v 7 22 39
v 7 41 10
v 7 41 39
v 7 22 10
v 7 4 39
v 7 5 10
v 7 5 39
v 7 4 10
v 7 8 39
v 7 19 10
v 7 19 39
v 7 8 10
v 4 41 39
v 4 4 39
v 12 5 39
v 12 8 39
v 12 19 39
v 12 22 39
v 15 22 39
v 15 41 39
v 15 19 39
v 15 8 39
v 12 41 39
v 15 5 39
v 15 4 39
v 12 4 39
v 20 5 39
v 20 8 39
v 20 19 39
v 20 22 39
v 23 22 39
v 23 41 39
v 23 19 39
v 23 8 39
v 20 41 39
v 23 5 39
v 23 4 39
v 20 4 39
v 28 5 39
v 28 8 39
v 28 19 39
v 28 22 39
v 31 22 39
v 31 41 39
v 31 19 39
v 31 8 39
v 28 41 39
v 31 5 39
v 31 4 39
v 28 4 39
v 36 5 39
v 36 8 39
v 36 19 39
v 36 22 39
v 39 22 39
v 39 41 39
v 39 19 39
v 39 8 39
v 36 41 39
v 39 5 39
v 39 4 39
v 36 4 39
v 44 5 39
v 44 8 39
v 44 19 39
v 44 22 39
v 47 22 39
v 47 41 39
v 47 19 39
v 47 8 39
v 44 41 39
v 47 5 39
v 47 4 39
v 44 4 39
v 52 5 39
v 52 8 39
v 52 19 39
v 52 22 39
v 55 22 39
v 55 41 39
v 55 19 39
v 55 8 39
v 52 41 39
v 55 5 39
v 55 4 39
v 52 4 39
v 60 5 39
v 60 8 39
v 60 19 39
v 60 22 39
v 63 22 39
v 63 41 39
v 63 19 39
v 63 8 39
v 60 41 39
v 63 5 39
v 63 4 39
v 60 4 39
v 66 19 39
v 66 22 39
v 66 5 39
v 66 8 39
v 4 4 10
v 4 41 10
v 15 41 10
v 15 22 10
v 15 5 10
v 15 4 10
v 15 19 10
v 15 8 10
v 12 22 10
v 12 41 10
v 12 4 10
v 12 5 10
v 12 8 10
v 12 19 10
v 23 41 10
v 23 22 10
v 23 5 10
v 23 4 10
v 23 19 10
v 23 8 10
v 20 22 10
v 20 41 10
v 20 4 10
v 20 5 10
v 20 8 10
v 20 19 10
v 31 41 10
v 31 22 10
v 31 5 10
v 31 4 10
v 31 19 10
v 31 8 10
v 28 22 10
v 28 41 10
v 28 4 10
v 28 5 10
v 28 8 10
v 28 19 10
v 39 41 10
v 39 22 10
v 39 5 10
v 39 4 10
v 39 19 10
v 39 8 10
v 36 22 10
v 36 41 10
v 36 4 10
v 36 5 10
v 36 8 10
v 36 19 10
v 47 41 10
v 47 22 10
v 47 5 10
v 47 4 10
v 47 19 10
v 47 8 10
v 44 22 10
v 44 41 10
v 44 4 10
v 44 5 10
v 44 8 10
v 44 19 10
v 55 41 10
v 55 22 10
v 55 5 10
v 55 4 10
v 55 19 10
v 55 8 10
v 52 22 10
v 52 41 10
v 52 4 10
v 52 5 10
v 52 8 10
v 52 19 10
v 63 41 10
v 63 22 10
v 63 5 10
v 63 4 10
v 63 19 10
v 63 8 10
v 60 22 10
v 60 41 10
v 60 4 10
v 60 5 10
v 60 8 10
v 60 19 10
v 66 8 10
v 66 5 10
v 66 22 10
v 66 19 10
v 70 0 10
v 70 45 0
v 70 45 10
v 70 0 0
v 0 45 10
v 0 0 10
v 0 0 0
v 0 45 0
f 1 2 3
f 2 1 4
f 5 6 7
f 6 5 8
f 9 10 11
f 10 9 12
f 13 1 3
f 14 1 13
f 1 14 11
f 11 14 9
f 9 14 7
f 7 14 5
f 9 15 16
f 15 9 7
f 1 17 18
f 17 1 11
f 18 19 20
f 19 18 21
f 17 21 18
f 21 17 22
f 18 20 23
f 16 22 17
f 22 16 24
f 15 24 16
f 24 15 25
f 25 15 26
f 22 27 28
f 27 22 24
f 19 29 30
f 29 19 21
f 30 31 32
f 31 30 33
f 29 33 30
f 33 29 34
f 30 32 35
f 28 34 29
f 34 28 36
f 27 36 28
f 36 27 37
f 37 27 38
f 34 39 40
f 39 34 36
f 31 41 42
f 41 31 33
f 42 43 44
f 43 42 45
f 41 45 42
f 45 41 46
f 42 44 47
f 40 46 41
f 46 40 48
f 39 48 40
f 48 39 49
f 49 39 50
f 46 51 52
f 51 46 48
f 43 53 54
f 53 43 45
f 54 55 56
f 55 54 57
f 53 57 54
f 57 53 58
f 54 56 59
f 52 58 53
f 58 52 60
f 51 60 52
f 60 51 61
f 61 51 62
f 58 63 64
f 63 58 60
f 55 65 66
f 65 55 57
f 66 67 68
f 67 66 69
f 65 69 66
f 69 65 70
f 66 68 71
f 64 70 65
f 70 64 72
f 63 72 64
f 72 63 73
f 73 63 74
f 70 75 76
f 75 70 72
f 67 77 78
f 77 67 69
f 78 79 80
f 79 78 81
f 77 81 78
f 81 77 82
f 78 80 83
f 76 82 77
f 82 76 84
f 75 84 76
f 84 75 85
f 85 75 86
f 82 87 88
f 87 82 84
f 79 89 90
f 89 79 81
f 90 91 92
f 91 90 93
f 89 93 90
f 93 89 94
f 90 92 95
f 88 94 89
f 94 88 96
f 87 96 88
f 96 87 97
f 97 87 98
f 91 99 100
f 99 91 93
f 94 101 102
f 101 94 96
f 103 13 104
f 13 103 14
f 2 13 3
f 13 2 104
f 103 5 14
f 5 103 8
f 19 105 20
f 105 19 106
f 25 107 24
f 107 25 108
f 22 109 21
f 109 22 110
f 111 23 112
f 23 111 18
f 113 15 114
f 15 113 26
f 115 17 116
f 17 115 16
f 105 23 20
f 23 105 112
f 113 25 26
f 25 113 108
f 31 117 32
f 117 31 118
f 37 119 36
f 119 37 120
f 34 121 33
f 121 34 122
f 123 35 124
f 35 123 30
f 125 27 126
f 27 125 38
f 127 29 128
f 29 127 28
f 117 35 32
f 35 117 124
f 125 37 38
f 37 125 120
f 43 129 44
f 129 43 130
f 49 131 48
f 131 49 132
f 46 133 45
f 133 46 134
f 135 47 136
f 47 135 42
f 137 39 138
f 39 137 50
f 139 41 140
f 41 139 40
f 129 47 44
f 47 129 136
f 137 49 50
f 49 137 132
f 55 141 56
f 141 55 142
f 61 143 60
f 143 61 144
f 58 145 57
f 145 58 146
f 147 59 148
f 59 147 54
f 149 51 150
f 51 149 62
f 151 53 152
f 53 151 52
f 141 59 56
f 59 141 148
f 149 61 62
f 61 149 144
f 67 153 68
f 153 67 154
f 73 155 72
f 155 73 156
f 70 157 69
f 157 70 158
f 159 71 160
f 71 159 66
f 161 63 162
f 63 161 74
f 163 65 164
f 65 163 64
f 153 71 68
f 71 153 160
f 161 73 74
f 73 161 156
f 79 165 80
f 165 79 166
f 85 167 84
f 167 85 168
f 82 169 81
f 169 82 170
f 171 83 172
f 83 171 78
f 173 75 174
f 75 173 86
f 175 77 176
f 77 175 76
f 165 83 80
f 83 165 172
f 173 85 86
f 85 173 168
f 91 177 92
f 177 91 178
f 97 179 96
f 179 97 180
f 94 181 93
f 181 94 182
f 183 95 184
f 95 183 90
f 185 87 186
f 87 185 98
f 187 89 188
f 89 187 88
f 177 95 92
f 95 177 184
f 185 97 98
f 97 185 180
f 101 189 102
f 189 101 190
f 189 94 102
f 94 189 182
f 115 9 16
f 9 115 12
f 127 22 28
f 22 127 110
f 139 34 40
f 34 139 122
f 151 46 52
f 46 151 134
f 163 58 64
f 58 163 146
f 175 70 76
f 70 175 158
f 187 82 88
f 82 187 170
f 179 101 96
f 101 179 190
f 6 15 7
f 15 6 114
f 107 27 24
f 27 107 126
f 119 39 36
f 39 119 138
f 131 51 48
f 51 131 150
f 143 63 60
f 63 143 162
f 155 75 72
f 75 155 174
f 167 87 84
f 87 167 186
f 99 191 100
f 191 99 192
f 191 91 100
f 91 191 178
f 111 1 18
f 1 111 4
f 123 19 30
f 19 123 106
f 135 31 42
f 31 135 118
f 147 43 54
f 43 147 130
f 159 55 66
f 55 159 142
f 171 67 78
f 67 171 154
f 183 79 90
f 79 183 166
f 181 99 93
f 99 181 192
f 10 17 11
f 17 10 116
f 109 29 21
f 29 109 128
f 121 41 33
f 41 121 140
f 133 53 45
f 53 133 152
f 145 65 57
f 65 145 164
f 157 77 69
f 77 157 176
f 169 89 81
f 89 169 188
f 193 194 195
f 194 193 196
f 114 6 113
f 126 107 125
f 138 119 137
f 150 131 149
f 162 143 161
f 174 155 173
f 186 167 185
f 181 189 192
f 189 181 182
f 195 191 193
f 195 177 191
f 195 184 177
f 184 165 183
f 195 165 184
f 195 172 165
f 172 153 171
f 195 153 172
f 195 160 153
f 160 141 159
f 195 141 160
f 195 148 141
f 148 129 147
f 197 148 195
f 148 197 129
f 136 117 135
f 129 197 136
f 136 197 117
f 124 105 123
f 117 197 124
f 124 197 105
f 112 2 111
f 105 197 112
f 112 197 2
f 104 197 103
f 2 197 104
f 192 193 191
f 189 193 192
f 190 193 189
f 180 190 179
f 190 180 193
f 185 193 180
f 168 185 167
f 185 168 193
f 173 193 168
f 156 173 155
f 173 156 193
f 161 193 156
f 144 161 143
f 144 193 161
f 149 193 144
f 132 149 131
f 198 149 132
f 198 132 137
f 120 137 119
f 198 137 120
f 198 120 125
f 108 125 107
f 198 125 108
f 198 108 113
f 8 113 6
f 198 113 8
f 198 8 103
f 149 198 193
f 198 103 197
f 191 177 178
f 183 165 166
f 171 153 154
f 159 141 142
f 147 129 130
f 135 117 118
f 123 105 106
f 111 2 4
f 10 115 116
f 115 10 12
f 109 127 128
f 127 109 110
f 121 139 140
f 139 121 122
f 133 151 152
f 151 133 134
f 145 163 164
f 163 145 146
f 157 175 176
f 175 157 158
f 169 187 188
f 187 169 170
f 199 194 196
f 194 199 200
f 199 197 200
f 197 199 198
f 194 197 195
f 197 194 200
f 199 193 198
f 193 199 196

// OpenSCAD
$fn = 32;

// ----------------------------------------------------------------------
// Heatsink: cross fin block
// ----------------------------------------------------------------------

// --- parameters (mm) ---
base_l = 70;              // base length, X
base_w = 45;              // base width, Y
base_t = 10;              // base plate thickness
fin_h = 30;               // fin height above the base
fin_t = 3;                // fin thickness
edge = 4;                 // margin from the base ends
pitch = 8;                // fin pitch
rib_pitch = 14;           // cross rib pitch

n_fins = floor((base_l - 2 * edge - fin_t) / pitch) + 1;  // fin count
total_h = base_t + fin_h - 1;  // overall height
n_ribs = floor((base_w - 2 * edge) / rib_pitch);  // rib count

union() {
  cube([base_l, base_w, base_t]);
  for (i = [0 : n_fins - 1])
    translate([edge + i * pitch, edge, base_t - 1])
      cube([fin_t, base_w - 2 * edge, fin_h]);
  for (i = [0 : n_ribs - 1])
    translate([edge, edge + 1 + i * rib_pitch, base_t - 1])
      cube([base_l - 2 * edge, fin_t, fin_h]);
}
